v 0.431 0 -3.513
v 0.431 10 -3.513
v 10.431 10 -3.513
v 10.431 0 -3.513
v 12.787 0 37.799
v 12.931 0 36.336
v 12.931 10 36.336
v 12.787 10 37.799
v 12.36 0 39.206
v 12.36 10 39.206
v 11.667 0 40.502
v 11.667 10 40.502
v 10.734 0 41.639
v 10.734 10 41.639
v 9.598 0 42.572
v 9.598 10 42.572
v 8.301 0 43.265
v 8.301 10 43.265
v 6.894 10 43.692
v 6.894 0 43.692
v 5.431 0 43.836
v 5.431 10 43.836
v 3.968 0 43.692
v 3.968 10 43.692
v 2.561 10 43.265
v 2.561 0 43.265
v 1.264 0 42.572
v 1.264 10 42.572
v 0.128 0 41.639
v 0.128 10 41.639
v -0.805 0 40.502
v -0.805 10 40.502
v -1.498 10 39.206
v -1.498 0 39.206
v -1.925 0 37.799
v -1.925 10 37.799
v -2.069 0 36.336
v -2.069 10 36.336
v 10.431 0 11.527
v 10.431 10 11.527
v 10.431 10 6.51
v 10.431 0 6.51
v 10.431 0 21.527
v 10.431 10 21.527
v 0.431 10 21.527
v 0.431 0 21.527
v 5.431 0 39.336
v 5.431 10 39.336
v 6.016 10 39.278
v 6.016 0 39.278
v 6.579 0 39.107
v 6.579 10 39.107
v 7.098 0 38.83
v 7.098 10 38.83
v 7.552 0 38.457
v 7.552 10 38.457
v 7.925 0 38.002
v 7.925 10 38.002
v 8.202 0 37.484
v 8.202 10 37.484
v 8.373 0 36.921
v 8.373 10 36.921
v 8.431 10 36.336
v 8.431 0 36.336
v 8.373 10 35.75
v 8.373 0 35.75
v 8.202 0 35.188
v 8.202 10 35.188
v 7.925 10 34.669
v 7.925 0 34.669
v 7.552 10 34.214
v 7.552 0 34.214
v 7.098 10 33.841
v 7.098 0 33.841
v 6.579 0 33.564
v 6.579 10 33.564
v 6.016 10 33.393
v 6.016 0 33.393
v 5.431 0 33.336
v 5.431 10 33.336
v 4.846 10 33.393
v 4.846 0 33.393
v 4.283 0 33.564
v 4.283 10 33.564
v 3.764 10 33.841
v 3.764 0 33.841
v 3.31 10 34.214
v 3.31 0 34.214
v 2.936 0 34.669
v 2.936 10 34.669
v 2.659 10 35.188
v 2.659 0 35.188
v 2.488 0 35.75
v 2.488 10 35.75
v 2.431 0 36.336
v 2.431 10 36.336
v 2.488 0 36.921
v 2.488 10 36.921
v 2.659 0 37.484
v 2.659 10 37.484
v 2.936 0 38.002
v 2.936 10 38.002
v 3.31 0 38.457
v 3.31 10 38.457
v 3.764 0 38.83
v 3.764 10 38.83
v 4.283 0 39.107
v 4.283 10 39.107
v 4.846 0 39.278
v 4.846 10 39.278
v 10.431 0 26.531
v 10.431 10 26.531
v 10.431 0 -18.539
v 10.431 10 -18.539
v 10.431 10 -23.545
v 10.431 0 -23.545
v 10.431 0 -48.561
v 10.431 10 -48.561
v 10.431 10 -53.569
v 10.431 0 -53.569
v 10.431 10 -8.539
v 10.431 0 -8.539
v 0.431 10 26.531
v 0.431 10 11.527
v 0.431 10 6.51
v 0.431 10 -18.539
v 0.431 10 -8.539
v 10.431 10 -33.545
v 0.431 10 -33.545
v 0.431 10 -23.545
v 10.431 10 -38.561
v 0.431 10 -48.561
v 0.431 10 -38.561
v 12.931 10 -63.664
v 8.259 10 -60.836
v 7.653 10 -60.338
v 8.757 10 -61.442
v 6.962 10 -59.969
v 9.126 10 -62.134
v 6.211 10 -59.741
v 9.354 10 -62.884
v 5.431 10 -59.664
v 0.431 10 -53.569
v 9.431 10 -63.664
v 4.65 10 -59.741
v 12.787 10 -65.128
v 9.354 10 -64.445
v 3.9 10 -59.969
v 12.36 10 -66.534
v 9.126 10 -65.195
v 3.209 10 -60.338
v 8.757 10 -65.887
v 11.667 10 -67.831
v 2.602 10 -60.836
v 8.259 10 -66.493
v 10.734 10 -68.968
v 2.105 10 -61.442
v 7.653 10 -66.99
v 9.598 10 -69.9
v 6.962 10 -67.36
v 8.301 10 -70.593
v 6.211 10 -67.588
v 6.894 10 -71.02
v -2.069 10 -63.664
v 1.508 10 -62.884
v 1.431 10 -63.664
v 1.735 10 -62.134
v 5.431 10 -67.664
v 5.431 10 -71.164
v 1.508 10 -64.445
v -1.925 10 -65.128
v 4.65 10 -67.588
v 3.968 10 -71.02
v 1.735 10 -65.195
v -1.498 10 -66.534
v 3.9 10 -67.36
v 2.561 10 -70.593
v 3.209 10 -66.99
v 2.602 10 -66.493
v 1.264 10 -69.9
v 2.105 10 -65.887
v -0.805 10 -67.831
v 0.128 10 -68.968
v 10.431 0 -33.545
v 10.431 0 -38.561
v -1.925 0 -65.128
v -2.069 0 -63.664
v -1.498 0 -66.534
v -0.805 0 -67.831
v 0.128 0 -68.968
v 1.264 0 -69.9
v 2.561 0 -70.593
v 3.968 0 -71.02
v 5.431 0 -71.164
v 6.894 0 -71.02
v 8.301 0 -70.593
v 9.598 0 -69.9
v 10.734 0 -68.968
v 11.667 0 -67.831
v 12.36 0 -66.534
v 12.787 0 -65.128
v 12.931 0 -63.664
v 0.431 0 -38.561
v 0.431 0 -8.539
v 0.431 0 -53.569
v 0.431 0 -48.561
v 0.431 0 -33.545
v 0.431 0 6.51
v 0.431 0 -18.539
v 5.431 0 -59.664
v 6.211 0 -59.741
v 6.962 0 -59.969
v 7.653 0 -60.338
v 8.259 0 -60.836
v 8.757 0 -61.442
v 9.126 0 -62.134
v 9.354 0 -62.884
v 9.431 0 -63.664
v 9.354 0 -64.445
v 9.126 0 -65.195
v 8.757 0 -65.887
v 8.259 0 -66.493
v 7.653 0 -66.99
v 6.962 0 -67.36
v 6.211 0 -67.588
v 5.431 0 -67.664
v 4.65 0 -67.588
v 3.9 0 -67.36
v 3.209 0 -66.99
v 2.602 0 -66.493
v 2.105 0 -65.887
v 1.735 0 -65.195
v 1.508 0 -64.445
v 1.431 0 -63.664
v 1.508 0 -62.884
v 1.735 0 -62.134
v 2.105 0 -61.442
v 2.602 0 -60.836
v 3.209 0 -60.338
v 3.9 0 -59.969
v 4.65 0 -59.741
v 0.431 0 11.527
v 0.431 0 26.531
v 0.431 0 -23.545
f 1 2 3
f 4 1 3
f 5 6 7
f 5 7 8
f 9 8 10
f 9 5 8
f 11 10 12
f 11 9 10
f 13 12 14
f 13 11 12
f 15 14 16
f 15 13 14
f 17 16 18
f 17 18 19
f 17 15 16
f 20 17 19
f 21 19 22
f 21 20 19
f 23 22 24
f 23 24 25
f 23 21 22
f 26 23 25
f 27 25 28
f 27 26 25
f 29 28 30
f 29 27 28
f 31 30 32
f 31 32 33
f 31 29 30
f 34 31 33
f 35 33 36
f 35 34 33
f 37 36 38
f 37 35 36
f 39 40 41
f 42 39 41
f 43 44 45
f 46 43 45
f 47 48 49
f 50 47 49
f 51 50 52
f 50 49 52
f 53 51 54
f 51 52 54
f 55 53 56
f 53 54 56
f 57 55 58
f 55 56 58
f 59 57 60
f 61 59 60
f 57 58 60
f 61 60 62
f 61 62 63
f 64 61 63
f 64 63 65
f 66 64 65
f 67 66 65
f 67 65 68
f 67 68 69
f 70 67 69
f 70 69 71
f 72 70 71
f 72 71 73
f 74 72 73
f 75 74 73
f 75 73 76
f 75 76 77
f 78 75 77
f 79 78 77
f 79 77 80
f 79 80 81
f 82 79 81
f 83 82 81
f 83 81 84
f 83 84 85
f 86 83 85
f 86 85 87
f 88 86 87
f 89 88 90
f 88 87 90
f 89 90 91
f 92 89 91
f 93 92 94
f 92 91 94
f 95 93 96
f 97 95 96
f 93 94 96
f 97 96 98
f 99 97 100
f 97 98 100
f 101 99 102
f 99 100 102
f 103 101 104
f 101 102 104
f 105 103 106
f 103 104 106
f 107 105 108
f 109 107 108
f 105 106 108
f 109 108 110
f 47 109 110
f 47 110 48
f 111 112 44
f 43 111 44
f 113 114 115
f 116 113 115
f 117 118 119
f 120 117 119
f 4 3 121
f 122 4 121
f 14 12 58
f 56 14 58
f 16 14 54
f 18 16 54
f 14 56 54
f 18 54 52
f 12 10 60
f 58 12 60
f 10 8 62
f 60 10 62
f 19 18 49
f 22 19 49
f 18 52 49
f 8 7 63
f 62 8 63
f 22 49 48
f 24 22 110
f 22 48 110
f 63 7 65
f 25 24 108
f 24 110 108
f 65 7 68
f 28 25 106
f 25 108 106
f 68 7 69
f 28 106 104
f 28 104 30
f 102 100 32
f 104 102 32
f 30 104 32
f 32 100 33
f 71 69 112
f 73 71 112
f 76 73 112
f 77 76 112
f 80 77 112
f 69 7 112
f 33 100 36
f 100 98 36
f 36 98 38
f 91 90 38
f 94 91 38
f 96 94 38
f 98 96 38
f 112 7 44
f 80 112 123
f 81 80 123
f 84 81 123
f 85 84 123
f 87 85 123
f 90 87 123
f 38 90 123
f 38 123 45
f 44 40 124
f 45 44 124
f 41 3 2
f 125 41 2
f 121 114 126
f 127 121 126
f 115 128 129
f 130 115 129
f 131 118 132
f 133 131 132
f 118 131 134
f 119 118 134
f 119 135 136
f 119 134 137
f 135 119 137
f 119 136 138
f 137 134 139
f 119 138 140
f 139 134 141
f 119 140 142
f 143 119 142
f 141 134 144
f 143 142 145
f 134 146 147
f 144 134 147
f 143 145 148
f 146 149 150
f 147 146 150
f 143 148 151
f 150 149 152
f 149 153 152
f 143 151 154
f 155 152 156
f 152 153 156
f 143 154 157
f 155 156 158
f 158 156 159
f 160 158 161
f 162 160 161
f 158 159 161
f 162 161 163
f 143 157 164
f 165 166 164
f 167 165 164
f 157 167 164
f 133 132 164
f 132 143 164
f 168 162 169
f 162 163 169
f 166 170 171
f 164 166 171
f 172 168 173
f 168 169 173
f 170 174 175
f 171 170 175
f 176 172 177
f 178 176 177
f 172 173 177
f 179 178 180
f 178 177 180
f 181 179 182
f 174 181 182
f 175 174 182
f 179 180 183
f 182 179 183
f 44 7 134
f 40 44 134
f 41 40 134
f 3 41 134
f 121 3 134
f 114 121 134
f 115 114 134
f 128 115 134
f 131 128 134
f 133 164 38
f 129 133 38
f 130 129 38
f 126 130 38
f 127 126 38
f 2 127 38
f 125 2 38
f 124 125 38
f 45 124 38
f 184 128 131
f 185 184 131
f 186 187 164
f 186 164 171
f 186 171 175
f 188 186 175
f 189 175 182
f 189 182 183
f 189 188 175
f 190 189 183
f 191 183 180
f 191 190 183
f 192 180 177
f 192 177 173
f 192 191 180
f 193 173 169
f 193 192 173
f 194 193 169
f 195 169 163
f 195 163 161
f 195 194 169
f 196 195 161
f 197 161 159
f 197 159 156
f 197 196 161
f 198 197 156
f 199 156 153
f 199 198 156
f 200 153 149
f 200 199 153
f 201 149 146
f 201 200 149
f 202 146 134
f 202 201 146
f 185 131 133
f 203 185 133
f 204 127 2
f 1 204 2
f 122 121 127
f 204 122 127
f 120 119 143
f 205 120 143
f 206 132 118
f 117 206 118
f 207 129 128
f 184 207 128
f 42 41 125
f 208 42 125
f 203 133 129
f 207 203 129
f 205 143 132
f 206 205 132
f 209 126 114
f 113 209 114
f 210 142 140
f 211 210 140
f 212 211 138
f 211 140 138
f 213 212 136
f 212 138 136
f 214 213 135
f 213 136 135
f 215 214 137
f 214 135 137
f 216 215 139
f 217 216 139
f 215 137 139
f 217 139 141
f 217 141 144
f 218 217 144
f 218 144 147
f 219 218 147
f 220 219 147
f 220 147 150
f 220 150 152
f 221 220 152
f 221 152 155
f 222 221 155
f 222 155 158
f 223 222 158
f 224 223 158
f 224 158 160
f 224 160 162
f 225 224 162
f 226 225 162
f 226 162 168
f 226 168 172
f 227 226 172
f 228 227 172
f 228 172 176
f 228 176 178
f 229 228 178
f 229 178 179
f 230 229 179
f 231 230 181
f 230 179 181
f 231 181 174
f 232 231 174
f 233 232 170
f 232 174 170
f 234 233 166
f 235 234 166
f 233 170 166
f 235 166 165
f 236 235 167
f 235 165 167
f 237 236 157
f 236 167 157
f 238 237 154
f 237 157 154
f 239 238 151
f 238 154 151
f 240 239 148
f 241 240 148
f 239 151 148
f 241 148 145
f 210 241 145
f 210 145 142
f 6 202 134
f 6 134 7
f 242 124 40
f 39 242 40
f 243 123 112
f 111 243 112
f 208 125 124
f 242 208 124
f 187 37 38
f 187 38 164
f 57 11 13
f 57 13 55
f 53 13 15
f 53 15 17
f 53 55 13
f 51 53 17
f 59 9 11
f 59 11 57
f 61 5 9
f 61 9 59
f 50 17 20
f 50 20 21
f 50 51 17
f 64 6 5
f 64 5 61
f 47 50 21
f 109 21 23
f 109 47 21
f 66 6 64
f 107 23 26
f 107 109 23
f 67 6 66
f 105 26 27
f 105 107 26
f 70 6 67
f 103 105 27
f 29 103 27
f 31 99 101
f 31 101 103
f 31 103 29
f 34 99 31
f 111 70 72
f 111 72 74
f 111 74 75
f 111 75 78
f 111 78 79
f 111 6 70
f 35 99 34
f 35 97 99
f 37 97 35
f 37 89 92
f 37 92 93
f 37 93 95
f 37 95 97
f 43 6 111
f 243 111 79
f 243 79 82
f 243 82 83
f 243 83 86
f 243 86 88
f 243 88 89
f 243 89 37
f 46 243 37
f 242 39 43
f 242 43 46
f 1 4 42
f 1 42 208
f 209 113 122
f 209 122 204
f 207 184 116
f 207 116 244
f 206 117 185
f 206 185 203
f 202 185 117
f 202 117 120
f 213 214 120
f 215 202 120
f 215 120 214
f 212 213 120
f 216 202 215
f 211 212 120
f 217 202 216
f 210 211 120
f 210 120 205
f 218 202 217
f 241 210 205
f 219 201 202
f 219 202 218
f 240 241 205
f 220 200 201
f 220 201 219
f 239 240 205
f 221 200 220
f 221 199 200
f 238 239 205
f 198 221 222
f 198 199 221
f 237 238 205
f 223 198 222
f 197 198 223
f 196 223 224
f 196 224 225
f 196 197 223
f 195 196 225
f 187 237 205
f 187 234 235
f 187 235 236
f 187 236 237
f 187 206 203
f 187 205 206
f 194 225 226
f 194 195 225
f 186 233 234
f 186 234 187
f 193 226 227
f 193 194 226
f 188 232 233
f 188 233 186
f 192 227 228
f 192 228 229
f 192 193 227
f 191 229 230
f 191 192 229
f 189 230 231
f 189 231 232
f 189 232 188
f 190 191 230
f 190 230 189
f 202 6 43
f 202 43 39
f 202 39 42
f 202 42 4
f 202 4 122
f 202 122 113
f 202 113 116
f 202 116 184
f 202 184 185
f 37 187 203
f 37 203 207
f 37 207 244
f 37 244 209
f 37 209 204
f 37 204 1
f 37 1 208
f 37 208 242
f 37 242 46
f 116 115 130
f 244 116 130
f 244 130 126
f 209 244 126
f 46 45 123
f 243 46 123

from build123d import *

# Parameters (mm, degrees)
BOSS_EXTRUDE1_DEPTH = 10
SKETCH8_R           = 4
CUT_EXTRUDE3_DEPTH  = 22
SKETCH14_R          = 3
CUT_EXTRUDE4_DEPTH  = 20


with BuildPart() as part:
    # Sketch1 → Boss-Extrude1 (new body)
    with BuildSketch(Plane(origin=(0, 0, 0), x_dir=(1, 0, 0), z_dir=(0, 1, 0))):
        with BuildLine():
            Line((12.93082957, 63.664368909), (12.93082957, -36.335631091))
            ThreePointArc((12.93082957, -36.335631091), (5.43082957, -43.835631091), (-2.06917043, -36.335631091))
            Line((-2.06917043, -36.335631091), (-2.06917043, 63.664368909))
            ThreePointArc((-2.06917043, 63.664368909), (5.43082957, 71.164368909), (12.93082957, 63.664368909))
        make_face()
    extrude(amount=BOSS_EXTRUDE1_DEPTH)

    # Sketch8 → Cut-Extrude3 (cut)
    with BuildSketch(Plane(origin=(0, 10, 0), x_dir=(1, 0, 0), z_dir=(0, 1, 0))):
        with Locations(Location((5.43082957, 63.664368909, 0), (0, 0, 270))):
            Circle(SKETCH8_R)
    extrude(amount=-CUT_EXTRUDE3_DEPTH, mode=Mode.SUBTRACT)

    # Sketch14 → Cut-Extrude4 (cut)
    with BuildSketch(Plane(origin=(0, 10, 0), x_dir=(1, 0, 0), z_dir=(0, 1, 0))):
        with Locations(Location((5.43082957, -36.335631091, 0), (0, 0, 270))):
            Circle(SKETCH14_R)
        Polygon((5.43082957, -21.527160564), (0.43082957, -21.527160564), (0.43082957, -26.531436495), (10.43082957, -26.531436495), (10.43082957, -21.527160564), align=None)
        Polygon((5.43082957, -6.509842668), (0.43082957, -6.509842668), (0.43082957, -11.527160564), (10.43082957, -11.527160564), (10.43082957, -6.509842668), align=None)
        Polygon((5.43082957, 8.538652281), (0.43082957, 8.538652281), (0.43082957, 3.51261249), (10.43082957, 3.51261249), (10.43082957, 8.538652281), align=None)
        Polygon((5.43082957, 23.544543967), (0.43082957, 23.544543967), (0.43082957, 18.538652281), (10.43082957, 18.538652281), (10.43082957, 23.544543967), align=None)
        Polygon((5.43082957, 38.56092778), (0.43082957, 38.56092778), (0.43082957, 33.544543967), (10.43082957, 33.544543967), (10.43082957, 38.56092778), align=None)
        Polygon((5.43082957, 53.568533881), (0.43082957, 53.568533881), (0.43082957, 48.56092778), (10.43082957, 48.56092778), (10.43082957, 53.568533881), align=None)
    extrude(amount=-CUT_EXTRUDE4_DEPTH, mode=Mode.SUBTRACT)


solid = part.part
